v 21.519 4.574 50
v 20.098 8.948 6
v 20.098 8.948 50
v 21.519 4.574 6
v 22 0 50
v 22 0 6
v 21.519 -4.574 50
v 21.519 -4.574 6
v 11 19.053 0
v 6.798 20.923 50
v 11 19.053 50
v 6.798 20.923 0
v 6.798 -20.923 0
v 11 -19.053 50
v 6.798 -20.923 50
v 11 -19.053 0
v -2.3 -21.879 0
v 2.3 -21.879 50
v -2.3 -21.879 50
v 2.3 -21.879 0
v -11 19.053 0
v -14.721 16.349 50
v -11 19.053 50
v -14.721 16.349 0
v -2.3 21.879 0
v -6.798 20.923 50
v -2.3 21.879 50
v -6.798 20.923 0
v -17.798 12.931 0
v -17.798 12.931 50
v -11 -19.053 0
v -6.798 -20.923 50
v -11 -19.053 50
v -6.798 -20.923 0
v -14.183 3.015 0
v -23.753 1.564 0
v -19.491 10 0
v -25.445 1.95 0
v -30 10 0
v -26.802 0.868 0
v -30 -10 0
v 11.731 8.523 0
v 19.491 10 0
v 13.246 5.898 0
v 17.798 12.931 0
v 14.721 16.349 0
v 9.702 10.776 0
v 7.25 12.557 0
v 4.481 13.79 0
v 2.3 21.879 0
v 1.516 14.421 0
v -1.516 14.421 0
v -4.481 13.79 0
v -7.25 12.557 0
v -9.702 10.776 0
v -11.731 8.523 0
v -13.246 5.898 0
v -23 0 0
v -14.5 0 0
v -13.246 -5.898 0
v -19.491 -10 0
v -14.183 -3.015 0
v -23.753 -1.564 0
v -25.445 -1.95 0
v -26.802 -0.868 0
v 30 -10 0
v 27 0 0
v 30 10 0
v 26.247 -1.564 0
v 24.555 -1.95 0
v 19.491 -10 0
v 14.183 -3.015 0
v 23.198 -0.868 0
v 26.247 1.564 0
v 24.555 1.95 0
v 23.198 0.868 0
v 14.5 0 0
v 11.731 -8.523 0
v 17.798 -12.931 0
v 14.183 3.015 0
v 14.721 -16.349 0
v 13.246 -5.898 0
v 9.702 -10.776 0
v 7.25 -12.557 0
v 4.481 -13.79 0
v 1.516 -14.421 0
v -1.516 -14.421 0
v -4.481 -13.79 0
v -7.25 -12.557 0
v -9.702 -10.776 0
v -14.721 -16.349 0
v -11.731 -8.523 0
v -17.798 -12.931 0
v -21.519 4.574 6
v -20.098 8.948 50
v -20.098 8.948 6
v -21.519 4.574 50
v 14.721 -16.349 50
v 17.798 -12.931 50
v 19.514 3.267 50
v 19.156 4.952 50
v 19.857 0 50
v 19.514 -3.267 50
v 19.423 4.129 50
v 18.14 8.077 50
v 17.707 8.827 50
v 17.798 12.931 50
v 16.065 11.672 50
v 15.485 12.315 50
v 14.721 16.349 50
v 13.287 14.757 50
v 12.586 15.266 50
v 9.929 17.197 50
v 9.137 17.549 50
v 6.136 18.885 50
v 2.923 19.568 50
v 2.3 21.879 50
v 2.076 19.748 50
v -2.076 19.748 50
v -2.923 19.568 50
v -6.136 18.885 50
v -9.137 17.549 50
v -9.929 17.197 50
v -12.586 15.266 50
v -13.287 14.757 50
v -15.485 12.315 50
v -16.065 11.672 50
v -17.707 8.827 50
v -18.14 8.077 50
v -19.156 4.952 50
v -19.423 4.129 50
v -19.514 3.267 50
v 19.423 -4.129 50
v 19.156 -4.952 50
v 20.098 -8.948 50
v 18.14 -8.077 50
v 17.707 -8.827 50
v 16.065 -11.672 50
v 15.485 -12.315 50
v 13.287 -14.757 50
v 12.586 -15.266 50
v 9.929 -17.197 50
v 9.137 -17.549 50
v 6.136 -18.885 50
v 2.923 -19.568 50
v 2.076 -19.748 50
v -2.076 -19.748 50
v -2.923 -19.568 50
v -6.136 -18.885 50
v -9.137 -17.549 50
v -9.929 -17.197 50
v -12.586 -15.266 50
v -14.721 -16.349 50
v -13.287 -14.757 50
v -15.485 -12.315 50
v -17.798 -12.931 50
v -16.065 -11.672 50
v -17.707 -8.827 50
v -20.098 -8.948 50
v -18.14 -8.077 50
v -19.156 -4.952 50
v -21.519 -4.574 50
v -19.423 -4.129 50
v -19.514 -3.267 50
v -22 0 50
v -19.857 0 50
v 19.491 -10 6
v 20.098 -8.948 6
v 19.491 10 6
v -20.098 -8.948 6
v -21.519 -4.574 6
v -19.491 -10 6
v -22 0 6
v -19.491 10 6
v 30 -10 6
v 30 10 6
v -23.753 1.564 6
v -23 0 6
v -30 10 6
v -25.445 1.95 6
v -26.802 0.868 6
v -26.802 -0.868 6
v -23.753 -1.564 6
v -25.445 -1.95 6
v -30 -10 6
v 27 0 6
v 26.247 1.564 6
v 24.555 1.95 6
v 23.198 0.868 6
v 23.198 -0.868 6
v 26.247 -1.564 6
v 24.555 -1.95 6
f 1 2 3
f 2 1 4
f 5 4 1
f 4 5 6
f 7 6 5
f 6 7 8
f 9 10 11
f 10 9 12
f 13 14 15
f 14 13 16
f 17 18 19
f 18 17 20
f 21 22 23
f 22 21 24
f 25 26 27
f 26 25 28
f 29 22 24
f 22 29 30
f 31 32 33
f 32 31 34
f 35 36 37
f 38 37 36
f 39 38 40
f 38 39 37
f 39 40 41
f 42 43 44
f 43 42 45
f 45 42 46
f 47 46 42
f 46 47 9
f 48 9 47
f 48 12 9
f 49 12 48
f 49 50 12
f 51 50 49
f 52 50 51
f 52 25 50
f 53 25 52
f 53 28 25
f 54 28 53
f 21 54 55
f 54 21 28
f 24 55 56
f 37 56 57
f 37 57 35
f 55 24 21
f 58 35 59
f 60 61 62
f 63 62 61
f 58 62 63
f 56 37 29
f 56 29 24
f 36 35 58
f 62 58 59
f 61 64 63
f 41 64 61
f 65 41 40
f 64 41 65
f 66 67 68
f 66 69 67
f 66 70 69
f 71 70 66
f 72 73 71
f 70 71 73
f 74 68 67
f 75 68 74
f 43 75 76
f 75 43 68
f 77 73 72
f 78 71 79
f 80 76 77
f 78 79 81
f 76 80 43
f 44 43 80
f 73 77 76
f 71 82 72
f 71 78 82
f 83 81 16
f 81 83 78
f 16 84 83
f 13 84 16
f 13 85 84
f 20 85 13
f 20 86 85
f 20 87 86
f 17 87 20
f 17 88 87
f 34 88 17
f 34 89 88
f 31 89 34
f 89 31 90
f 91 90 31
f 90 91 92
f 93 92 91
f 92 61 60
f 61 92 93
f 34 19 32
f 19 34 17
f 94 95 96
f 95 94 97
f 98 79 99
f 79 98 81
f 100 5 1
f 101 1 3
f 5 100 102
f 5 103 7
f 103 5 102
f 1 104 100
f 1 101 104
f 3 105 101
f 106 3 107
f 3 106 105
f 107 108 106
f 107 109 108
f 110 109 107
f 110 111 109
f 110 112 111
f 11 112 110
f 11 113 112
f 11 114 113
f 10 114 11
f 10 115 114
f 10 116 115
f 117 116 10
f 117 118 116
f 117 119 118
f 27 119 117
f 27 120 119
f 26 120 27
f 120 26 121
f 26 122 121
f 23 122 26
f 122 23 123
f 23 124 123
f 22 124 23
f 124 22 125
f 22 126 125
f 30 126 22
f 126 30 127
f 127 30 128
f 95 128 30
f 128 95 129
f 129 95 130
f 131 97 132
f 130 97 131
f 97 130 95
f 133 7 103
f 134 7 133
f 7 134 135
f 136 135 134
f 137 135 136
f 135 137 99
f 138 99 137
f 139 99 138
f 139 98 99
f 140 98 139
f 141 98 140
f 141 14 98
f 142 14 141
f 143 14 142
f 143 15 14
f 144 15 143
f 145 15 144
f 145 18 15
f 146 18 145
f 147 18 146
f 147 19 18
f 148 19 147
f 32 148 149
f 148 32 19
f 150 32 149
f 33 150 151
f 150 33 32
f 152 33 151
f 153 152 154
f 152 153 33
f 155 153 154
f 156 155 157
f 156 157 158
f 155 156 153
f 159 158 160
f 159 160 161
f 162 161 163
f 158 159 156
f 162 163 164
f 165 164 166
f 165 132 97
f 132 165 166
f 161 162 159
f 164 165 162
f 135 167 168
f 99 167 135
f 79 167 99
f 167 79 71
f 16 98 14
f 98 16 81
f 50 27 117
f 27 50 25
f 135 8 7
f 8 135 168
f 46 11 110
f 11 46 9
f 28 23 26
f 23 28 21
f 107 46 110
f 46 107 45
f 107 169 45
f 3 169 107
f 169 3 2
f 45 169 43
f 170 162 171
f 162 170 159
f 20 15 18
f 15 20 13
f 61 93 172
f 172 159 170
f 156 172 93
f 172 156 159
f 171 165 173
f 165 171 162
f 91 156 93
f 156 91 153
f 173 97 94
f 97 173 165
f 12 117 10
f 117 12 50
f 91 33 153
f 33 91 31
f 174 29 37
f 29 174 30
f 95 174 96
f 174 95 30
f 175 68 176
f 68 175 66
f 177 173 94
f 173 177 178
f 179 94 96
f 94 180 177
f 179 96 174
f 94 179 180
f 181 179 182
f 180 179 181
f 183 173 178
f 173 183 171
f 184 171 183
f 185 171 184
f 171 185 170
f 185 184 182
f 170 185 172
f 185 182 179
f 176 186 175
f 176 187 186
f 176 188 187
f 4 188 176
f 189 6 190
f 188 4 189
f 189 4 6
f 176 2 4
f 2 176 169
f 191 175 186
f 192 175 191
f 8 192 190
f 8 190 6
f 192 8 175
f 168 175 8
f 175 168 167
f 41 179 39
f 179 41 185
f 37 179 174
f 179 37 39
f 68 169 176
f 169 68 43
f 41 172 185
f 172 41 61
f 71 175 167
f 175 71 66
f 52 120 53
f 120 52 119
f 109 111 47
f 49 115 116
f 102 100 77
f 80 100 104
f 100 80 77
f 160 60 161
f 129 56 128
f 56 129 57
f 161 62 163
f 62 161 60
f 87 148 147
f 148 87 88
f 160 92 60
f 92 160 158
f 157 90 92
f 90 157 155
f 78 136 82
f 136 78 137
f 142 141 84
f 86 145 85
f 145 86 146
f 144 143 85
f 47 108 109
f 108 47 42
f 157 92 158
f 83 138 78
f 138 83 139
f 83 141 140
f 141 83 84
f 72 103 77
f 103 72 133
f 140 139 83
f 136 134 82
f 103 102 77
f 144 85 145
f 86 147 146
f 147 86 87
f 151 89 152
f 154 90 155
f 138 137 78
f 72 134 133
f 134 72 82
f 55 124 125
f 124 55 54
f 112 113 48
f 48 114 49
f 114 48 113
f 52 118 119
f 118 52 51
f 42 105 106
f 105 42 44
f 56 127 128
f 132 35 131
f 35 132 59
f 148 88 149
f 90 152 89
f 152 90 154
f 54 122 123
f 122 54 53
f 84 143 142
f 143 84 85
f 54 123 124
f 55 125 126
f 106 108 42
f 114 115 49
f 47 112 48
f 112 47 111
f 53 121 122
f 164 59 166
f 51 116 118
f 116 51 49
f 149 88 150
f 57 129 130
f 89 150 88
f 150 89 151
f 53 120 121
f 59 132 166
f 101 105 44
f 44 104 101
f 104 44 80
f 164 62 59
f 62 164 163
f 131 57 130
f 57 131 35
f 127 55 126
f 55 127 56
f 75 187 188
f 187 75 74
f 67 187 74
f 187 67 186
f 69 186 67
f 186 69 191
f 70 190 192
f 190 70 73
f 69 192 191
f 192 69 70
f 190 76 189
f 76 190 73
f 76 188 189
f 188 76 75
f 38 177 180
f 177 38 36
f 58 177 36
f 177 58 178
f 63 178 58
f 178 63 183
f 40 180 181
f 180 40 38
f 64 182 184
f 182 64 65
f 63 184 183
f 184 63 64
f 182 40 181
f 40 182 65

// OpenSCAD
// file: ../../../libs/configuration.scad
echo("configuration.scad"); 
//©2011 Tom Cramer"
//license GNU GPL v2, or any later ....
//pdiam based on Nophead's : http://hydraraptor.blogspot.com/2011/02/polyholes.html 


tolerance=0.2;
function pdiam(diam)=(diam) / cos (180 / max(round(2 * diam),3))+tolerance;

m3_diam=pdiam(3);
m3_nut=pdiam(6.4);
m3_nut_H=3.8;
m3_cap=pdiam(5.5);
m3_cap_H=4;
m4_diam=pdiam(4);
m4_nut=pdiam(8.1);
m4_nut_H=4;
m4_cap=pdiam(7);
m4_cap_H=4.8;
m5_diam=pdiam(5);
m5_cap=pdiam(8.5);
m5_cap_H=5.1;
m8_diam=pdiam(8);
m8_nut=pdiam(15);
m8_nut_H=8;
624_H=5;
624_diam=pdiam(13);
608_H=7;
608_diam=pdiam(22);
x_smoothRod_dist=50;
nema17_OD=42.7;
nema17_mounting_hole_dist=31.4;
nema17_ID_clearance=22;
nema17_mounting_hole_distance=nema17_mounting_hole_dist;
nema17_height=47;
nema17_shaft_OD=5;

Oak = [0.65, 0.5, 0.4];
Pine = [0.85, 0.7, 0.45];
Birch = [0.9, 0.8, 0.6];
FiberBoard = [0.7, 0.67, 0.6];
BlackPaint = [0.2, 0.2, 0.2];
Iron = [0.36, 0.33, 0.33];
Steel = [0.65, 0.67, 0.72];
Stainless = [0.45, 0.43, 0.5];
Aluminum = [0.77, 0.77, 0.8];
Brass = [0.88, 0.78, 0.5];
Transparent = [1, 1, 1, 0.2];
Silver=[230/255,230/255,230/255];
PlasticGreen=[0,1,0];
PlasticRed=[1,0,0];
PlasticBlue=[0,0,1];


//***prusa conversions:

smooth_rod_diameter=m8_diam;
threaded_rod_diameter=m8_diam;
m3_diameter=m3_diam;
m4_diameter=m4_diam;
m8_diameter=m8_diam;
m3_nut_diameter=m3_nut;
m4_nut_diameter=m4_nut;
m8_nut_diameter=m8_nut;

module nut(d,h,horizontal=true){
cornerdiameter =  (d / 2) / cos (180 / 6);
cylinder(h = h, r = cornerdiameter, $fn = 6);
if(horizontal){
for(i = [1:6]){
	rotate([0,0,60*i]) translate([-cornerdiameter-0.2,0,0]) rotate([0,0,-45]) cube(size = [2,2,h]);
}}
}

// Based on nophead research
module polyhole(d,h) {
    n = max(round(2 * d),3);
    rotate([0,0,180])
        cylinder(h = h, r = (d / 2) / cos (180 / n), $fn = n);
}




module roundcorner(diameter){
	difference(){
		cube(size = [diameter,diameter,99], center = false);
		translate(v = [diameter, diameter, 0]) cylinder(h = 100, r=diameter,$fn=round(diameter*4), center=true);
	}
}

//teardrop(3/2,12);

module teardrop (r=8,h=20,rotation=0)
{
$fn=18;
translate([-h/2,0,0])	
rotate([-270,rotation,90])
	linear_extrude(height=h)
	{
		circle(r=r);
		polygon(points=[[0,0],[r*cos(30),r*sin(30)],[0.5*r,r],[-0.5*r,r],[-r*cos(30),r*sin(30)]],
				paths=[[0,1,2,3,4]]);
	}
}
//nema_bolts(12,limit=false);
module nema_bolts(long=12,rotation=0,limit=false){
translate([0,0,0]){

			color(Stainless)translate([0,nema17_mounting_hole_distance/2,nema17_mounting_hole_distance/2,])teardrop(r=m3_diam/2,h=long,rotation=rotation);
			color(Stainless)translate([-long/4,nema17_mounting_hole_distance/2,nema17_mounting_hole_distance/2])teardrop(r=m3_cap/2,h=long/2,rotation=rotation);

color(Stainless)translate([0,-nema17_mounting_hole_distance/2,nema17_mounting_hole_distance/2])teardrop(r=m3_diam/2,h=long,rotation=rotation);
			color(Stainless)translate([-long/4,-nema17_mounting_hole_distance/2,nema17_mounting_hole_distance/2])teardrop(r=m3_cap/2,h=long/2,rotation=rotation);	

color(Stainless)translate([0,-nema17_mounting_hole_distance/2,-nema17_mounting_hole_distance/2])teardrop(r=m3_diam/2,h=long,rotation=rotation);
			color(Stainless)translate([-long/4,-nema17_mounting_hole_distance/2,-nema17_mounting_hole_distance/2])teardrop(r=m3_cap/2,h=long/2,rotation=rotation);

if(!limit){
color(Stainless)translate([0,nema17_mounting_hole_distance/2,-nema17_mounting_hole_distance/2])teardrop(r=m3_diam/2,h=long,rotation=rotation);
			color(Stainless)translate([-long/4,nema17_mounting_hole_distance/2,-nema17_mounting_hole_distance/2])teardrop(r=m3_cap/2,h=long/2,rotation=rotation);	
}

}		
}
// file: ../../../libs/nema17_motor.scad
echo("nema_motor.scad"); 
//©2011 Tom Cramer
//license GNU GPL v2

include<configuration.scad>

//nema17
motor_OD=42.7;
motor_mounting_hole_distance=31.4;
motor_mounting_hole_diam=m3_diam;
motor_height=47;
motor_shaft_OD=5;
motor_shaft_height = 22.7;
motor_flange_dia = 22;
motor_flange_height = 2;

//nema14
//motor_OD=35;
//motor_mounting_hole_distance=26;
//motor_mounting_hole_diam=m3_diam;
//motor_height=38.2;
//motor_shaft_OD=5;
//motor_shaft_height = 21.75;
//motor_flange_dia = 22;
//motor_flange_height = 2;


with_pulley=false;


//show
//translate([0,0,-motor_height/2])nema();
//nema_bolts();
//nema();

module nema(){



if(with_pulley){
color(PlasticRed)translate([0,0,26])rotate([0,0,0])import("pulley.stl");
}
	difference(){
		union(){
		color(Silver)translate([0,0,(motor_shaft_height+motor_height+motor_flange_height)/2])cylinder(r=motor_shaft_OD/2,h=motor_shaft_height,$fn=18,center=true);
		color(Aluminum)translate([0,0,(motor_height+motor_flange_height-0.01)/2])cylinder(r=motor_flange_dia/2,h=motor_flange_height,$fn=36,center=true);
		color(BlackPaint)linear_extrude(height=(motor_height/6)*4,center=true) outline();
		color(Aluminum)translate([0,0,(motor_height/1.5+motor_height/6-0.1)/2])linear_extrude(height=(motor_height/6),center=true) outline();
		color(Aluminum)translate([0,0,-(motor_height/1.5+motor_height/6-0.1)/2])linear_extrude(height=(motor_height/6),center=true) outline();
		}

	translate([motor_mounting_hole_distance/2,motor_mounting_hole_distance/2,0])cylinder(r=motor_mounting_hole_diam/2,h=motor_height+1,$fn=8,center=true);
	translate([-motor_mounting_hole_distance/2,motor_mounting_hole_distance/2,0])cylinder(r=motor_mounting_hole_diam/2,h=motor_height+1,$fn=8,center=true);
	translate([-motor_mounting_hole_distance/2,-motor_mounting_hole_distance/2,0])cylinder(r=motor_mounting_hole_diam/2,h=motor_height+1,$fn=8,center=true);
	translate([motor_mounting_hole_distance/2,-motor_mounting_hole_distance/2,0])cylinder(r=motor_mounting_hole_diam/2,h=motor_height+1,$fn=8,center=true);
	//color(Silver)translate([0,0,(motor_shaft_height+motor_height+motor_flange_height)/2])cylinder(r=motor_shaft_OD/2,h=motor_shaft_height,$fn=18,center=true);
	}

}

module outline(){
 
polygon(points=[[-motor_mounting_hole_distance/2,-motor_OD/2],[-motor_OD/2,-motor_mounting_hole_distance/2],[-motor_OD/2,motor_mounting_hole_distance/2],[-motor_mounting_hole_distance/2,motor_OD/2],[motor_mounting_hole_distance/2,motor_OD/2],[motor_OD/2,motor_mounting_hole_distance/2],[motor_OD/2,-motor_mounting_hole_distance/2],[motor_mounting_hole_distance/2,-motor_OD/2]]);

}
// main file
include<../../../libs/nema17_motor.scad>


bushing_depth = 2.3;
bushing_dia = 26;

outer_diameter = 34;

total_height =4;

hole_dia = 8;

//motor_mount();

//rotate(a=180,v=[0,1,0]) bearing_disk();


hopper();

module hopper(){
		difference(){			
			union(){
				cylinder(r=22, h=50); 
				translate(v=[0,0,3]) cube(size=[60,20,6], center=true);
			}
			// feeder
			translate(v=[0,0,0]) cylinder(r1=(outer_diameter-5)/2, r2=(outer_diameter+10)/2, h=70); 
			// side mounting bolts
			translate(v=[25,0,0]) cylinder(r=2,h=80);
			translate(v=[-25,0,0]) cylinder(r=2,h=80);
	}	
}

module bearing_disk(){
	difference(){
		cylinder(r=outer_diameter/2, h=total_height);
		// motor stuff
		difference(){	
			cylinder(r=2.6, h=total_height);
			translate(v=[-5,1.5,0]) cube(size=[10,10,total_height]);	
		}
		for (i = [0:5]) {
			rotate(a=60*i, v=[0,0,1]) translate(v=[10,-2.5,0]) cylinder(r=hole_dia/2, h=total_height);
			for(f=[1:7]){
				rotate(a=60*i-f*2, v=[0,0,1]) translate(v=[10+f,-2.5-f,total_height-0.75]) cylinder(r=hole_dia/2, h=total_height);
			}
		}	

	}
}

bearing_dia = 22;
margin = 1.5;
bearing_height=7;

module motor_mount(){
translate(v=[0,0,-16.5]){
	difference(){
		difference(){			
			union(){
				cylinder(r=25, h=16); 
				translate(v=[0,0,(16+total_height+0.4)/2]) cube(size=[60,20,16+total_height+0.4], center=true);
			}
			// cut mouting part away
			translate(v=[0,0,16]) cylinder(r=31+1, h=16); 
			// side mounting bolts
			translate(v=[25,0,0]) cylinder(r=2,h=80);
			translate(v=[-25,0,0]) cylinder(r=2,h=80);

			// flat part for disk
			translate(v=[0,0,16-total_height-0.3]) cylinder(r=(outer_diameter+2)/2, h=total_height+0.5);

			// eject part
			translate(v=[0,37,8]) rotate(a=-30,v=[1,0,0]) cube(size=[9,50,16], center=true);
		}				

		// motor flange	
		cylinder(r=12,h=3);
			
		translate(v=[0,0,3]) cylinder(r1=12, r2=5,h=10);
		translate(v=[0,0,0]){	
			translate([motor_mounting_hole_distance/2,motor_mounting_hole_distance/2,-0.5])cylinder(r=motor_mounting_hole_diam/2,h=80);
			translate([motor_mounting_hole_distance/2,-motor_mounting_hole_distance/2,-0.5])cylinder(r=motor_mounting_hole_diam/2,h=80);
			translate([-motor_mounting_hole_distance/2,motor_mounting_hole_distance/2,-0.5])cylinder(r=motor_mounting_hole_diam/2,h=80);
			translate([-motor_mounting_hole_distance/2,-motor_mounting_hole_distance/2,-0.5])cylinder(r=motor_mounting_hole_diam/2,h=80);
		}
		// holes for screw heads
		translate(v=[0,0,6]){	
			translate([motor_mounting_hole_distance/2,motor_mounting_hole_distance/2,-0.5])cylinder(r=3.5,h=80);
			translate([motor_mounting_hole_distance/2,-motor_mounting_hole_distance/2,-0.5])cylinder(r=3.5,h=80);
			translate([-motor_mounting_hole_distance/2,motor_mounting_hole_distance/2,-0.5])cylinder(r=3.5,h=80);
			translate([-motor_mounting_hole_distance/2,-motor_mounting_hole_distance/2,-0.5])cylinder(r=3.5,h=80);
		}


	}
}

}
